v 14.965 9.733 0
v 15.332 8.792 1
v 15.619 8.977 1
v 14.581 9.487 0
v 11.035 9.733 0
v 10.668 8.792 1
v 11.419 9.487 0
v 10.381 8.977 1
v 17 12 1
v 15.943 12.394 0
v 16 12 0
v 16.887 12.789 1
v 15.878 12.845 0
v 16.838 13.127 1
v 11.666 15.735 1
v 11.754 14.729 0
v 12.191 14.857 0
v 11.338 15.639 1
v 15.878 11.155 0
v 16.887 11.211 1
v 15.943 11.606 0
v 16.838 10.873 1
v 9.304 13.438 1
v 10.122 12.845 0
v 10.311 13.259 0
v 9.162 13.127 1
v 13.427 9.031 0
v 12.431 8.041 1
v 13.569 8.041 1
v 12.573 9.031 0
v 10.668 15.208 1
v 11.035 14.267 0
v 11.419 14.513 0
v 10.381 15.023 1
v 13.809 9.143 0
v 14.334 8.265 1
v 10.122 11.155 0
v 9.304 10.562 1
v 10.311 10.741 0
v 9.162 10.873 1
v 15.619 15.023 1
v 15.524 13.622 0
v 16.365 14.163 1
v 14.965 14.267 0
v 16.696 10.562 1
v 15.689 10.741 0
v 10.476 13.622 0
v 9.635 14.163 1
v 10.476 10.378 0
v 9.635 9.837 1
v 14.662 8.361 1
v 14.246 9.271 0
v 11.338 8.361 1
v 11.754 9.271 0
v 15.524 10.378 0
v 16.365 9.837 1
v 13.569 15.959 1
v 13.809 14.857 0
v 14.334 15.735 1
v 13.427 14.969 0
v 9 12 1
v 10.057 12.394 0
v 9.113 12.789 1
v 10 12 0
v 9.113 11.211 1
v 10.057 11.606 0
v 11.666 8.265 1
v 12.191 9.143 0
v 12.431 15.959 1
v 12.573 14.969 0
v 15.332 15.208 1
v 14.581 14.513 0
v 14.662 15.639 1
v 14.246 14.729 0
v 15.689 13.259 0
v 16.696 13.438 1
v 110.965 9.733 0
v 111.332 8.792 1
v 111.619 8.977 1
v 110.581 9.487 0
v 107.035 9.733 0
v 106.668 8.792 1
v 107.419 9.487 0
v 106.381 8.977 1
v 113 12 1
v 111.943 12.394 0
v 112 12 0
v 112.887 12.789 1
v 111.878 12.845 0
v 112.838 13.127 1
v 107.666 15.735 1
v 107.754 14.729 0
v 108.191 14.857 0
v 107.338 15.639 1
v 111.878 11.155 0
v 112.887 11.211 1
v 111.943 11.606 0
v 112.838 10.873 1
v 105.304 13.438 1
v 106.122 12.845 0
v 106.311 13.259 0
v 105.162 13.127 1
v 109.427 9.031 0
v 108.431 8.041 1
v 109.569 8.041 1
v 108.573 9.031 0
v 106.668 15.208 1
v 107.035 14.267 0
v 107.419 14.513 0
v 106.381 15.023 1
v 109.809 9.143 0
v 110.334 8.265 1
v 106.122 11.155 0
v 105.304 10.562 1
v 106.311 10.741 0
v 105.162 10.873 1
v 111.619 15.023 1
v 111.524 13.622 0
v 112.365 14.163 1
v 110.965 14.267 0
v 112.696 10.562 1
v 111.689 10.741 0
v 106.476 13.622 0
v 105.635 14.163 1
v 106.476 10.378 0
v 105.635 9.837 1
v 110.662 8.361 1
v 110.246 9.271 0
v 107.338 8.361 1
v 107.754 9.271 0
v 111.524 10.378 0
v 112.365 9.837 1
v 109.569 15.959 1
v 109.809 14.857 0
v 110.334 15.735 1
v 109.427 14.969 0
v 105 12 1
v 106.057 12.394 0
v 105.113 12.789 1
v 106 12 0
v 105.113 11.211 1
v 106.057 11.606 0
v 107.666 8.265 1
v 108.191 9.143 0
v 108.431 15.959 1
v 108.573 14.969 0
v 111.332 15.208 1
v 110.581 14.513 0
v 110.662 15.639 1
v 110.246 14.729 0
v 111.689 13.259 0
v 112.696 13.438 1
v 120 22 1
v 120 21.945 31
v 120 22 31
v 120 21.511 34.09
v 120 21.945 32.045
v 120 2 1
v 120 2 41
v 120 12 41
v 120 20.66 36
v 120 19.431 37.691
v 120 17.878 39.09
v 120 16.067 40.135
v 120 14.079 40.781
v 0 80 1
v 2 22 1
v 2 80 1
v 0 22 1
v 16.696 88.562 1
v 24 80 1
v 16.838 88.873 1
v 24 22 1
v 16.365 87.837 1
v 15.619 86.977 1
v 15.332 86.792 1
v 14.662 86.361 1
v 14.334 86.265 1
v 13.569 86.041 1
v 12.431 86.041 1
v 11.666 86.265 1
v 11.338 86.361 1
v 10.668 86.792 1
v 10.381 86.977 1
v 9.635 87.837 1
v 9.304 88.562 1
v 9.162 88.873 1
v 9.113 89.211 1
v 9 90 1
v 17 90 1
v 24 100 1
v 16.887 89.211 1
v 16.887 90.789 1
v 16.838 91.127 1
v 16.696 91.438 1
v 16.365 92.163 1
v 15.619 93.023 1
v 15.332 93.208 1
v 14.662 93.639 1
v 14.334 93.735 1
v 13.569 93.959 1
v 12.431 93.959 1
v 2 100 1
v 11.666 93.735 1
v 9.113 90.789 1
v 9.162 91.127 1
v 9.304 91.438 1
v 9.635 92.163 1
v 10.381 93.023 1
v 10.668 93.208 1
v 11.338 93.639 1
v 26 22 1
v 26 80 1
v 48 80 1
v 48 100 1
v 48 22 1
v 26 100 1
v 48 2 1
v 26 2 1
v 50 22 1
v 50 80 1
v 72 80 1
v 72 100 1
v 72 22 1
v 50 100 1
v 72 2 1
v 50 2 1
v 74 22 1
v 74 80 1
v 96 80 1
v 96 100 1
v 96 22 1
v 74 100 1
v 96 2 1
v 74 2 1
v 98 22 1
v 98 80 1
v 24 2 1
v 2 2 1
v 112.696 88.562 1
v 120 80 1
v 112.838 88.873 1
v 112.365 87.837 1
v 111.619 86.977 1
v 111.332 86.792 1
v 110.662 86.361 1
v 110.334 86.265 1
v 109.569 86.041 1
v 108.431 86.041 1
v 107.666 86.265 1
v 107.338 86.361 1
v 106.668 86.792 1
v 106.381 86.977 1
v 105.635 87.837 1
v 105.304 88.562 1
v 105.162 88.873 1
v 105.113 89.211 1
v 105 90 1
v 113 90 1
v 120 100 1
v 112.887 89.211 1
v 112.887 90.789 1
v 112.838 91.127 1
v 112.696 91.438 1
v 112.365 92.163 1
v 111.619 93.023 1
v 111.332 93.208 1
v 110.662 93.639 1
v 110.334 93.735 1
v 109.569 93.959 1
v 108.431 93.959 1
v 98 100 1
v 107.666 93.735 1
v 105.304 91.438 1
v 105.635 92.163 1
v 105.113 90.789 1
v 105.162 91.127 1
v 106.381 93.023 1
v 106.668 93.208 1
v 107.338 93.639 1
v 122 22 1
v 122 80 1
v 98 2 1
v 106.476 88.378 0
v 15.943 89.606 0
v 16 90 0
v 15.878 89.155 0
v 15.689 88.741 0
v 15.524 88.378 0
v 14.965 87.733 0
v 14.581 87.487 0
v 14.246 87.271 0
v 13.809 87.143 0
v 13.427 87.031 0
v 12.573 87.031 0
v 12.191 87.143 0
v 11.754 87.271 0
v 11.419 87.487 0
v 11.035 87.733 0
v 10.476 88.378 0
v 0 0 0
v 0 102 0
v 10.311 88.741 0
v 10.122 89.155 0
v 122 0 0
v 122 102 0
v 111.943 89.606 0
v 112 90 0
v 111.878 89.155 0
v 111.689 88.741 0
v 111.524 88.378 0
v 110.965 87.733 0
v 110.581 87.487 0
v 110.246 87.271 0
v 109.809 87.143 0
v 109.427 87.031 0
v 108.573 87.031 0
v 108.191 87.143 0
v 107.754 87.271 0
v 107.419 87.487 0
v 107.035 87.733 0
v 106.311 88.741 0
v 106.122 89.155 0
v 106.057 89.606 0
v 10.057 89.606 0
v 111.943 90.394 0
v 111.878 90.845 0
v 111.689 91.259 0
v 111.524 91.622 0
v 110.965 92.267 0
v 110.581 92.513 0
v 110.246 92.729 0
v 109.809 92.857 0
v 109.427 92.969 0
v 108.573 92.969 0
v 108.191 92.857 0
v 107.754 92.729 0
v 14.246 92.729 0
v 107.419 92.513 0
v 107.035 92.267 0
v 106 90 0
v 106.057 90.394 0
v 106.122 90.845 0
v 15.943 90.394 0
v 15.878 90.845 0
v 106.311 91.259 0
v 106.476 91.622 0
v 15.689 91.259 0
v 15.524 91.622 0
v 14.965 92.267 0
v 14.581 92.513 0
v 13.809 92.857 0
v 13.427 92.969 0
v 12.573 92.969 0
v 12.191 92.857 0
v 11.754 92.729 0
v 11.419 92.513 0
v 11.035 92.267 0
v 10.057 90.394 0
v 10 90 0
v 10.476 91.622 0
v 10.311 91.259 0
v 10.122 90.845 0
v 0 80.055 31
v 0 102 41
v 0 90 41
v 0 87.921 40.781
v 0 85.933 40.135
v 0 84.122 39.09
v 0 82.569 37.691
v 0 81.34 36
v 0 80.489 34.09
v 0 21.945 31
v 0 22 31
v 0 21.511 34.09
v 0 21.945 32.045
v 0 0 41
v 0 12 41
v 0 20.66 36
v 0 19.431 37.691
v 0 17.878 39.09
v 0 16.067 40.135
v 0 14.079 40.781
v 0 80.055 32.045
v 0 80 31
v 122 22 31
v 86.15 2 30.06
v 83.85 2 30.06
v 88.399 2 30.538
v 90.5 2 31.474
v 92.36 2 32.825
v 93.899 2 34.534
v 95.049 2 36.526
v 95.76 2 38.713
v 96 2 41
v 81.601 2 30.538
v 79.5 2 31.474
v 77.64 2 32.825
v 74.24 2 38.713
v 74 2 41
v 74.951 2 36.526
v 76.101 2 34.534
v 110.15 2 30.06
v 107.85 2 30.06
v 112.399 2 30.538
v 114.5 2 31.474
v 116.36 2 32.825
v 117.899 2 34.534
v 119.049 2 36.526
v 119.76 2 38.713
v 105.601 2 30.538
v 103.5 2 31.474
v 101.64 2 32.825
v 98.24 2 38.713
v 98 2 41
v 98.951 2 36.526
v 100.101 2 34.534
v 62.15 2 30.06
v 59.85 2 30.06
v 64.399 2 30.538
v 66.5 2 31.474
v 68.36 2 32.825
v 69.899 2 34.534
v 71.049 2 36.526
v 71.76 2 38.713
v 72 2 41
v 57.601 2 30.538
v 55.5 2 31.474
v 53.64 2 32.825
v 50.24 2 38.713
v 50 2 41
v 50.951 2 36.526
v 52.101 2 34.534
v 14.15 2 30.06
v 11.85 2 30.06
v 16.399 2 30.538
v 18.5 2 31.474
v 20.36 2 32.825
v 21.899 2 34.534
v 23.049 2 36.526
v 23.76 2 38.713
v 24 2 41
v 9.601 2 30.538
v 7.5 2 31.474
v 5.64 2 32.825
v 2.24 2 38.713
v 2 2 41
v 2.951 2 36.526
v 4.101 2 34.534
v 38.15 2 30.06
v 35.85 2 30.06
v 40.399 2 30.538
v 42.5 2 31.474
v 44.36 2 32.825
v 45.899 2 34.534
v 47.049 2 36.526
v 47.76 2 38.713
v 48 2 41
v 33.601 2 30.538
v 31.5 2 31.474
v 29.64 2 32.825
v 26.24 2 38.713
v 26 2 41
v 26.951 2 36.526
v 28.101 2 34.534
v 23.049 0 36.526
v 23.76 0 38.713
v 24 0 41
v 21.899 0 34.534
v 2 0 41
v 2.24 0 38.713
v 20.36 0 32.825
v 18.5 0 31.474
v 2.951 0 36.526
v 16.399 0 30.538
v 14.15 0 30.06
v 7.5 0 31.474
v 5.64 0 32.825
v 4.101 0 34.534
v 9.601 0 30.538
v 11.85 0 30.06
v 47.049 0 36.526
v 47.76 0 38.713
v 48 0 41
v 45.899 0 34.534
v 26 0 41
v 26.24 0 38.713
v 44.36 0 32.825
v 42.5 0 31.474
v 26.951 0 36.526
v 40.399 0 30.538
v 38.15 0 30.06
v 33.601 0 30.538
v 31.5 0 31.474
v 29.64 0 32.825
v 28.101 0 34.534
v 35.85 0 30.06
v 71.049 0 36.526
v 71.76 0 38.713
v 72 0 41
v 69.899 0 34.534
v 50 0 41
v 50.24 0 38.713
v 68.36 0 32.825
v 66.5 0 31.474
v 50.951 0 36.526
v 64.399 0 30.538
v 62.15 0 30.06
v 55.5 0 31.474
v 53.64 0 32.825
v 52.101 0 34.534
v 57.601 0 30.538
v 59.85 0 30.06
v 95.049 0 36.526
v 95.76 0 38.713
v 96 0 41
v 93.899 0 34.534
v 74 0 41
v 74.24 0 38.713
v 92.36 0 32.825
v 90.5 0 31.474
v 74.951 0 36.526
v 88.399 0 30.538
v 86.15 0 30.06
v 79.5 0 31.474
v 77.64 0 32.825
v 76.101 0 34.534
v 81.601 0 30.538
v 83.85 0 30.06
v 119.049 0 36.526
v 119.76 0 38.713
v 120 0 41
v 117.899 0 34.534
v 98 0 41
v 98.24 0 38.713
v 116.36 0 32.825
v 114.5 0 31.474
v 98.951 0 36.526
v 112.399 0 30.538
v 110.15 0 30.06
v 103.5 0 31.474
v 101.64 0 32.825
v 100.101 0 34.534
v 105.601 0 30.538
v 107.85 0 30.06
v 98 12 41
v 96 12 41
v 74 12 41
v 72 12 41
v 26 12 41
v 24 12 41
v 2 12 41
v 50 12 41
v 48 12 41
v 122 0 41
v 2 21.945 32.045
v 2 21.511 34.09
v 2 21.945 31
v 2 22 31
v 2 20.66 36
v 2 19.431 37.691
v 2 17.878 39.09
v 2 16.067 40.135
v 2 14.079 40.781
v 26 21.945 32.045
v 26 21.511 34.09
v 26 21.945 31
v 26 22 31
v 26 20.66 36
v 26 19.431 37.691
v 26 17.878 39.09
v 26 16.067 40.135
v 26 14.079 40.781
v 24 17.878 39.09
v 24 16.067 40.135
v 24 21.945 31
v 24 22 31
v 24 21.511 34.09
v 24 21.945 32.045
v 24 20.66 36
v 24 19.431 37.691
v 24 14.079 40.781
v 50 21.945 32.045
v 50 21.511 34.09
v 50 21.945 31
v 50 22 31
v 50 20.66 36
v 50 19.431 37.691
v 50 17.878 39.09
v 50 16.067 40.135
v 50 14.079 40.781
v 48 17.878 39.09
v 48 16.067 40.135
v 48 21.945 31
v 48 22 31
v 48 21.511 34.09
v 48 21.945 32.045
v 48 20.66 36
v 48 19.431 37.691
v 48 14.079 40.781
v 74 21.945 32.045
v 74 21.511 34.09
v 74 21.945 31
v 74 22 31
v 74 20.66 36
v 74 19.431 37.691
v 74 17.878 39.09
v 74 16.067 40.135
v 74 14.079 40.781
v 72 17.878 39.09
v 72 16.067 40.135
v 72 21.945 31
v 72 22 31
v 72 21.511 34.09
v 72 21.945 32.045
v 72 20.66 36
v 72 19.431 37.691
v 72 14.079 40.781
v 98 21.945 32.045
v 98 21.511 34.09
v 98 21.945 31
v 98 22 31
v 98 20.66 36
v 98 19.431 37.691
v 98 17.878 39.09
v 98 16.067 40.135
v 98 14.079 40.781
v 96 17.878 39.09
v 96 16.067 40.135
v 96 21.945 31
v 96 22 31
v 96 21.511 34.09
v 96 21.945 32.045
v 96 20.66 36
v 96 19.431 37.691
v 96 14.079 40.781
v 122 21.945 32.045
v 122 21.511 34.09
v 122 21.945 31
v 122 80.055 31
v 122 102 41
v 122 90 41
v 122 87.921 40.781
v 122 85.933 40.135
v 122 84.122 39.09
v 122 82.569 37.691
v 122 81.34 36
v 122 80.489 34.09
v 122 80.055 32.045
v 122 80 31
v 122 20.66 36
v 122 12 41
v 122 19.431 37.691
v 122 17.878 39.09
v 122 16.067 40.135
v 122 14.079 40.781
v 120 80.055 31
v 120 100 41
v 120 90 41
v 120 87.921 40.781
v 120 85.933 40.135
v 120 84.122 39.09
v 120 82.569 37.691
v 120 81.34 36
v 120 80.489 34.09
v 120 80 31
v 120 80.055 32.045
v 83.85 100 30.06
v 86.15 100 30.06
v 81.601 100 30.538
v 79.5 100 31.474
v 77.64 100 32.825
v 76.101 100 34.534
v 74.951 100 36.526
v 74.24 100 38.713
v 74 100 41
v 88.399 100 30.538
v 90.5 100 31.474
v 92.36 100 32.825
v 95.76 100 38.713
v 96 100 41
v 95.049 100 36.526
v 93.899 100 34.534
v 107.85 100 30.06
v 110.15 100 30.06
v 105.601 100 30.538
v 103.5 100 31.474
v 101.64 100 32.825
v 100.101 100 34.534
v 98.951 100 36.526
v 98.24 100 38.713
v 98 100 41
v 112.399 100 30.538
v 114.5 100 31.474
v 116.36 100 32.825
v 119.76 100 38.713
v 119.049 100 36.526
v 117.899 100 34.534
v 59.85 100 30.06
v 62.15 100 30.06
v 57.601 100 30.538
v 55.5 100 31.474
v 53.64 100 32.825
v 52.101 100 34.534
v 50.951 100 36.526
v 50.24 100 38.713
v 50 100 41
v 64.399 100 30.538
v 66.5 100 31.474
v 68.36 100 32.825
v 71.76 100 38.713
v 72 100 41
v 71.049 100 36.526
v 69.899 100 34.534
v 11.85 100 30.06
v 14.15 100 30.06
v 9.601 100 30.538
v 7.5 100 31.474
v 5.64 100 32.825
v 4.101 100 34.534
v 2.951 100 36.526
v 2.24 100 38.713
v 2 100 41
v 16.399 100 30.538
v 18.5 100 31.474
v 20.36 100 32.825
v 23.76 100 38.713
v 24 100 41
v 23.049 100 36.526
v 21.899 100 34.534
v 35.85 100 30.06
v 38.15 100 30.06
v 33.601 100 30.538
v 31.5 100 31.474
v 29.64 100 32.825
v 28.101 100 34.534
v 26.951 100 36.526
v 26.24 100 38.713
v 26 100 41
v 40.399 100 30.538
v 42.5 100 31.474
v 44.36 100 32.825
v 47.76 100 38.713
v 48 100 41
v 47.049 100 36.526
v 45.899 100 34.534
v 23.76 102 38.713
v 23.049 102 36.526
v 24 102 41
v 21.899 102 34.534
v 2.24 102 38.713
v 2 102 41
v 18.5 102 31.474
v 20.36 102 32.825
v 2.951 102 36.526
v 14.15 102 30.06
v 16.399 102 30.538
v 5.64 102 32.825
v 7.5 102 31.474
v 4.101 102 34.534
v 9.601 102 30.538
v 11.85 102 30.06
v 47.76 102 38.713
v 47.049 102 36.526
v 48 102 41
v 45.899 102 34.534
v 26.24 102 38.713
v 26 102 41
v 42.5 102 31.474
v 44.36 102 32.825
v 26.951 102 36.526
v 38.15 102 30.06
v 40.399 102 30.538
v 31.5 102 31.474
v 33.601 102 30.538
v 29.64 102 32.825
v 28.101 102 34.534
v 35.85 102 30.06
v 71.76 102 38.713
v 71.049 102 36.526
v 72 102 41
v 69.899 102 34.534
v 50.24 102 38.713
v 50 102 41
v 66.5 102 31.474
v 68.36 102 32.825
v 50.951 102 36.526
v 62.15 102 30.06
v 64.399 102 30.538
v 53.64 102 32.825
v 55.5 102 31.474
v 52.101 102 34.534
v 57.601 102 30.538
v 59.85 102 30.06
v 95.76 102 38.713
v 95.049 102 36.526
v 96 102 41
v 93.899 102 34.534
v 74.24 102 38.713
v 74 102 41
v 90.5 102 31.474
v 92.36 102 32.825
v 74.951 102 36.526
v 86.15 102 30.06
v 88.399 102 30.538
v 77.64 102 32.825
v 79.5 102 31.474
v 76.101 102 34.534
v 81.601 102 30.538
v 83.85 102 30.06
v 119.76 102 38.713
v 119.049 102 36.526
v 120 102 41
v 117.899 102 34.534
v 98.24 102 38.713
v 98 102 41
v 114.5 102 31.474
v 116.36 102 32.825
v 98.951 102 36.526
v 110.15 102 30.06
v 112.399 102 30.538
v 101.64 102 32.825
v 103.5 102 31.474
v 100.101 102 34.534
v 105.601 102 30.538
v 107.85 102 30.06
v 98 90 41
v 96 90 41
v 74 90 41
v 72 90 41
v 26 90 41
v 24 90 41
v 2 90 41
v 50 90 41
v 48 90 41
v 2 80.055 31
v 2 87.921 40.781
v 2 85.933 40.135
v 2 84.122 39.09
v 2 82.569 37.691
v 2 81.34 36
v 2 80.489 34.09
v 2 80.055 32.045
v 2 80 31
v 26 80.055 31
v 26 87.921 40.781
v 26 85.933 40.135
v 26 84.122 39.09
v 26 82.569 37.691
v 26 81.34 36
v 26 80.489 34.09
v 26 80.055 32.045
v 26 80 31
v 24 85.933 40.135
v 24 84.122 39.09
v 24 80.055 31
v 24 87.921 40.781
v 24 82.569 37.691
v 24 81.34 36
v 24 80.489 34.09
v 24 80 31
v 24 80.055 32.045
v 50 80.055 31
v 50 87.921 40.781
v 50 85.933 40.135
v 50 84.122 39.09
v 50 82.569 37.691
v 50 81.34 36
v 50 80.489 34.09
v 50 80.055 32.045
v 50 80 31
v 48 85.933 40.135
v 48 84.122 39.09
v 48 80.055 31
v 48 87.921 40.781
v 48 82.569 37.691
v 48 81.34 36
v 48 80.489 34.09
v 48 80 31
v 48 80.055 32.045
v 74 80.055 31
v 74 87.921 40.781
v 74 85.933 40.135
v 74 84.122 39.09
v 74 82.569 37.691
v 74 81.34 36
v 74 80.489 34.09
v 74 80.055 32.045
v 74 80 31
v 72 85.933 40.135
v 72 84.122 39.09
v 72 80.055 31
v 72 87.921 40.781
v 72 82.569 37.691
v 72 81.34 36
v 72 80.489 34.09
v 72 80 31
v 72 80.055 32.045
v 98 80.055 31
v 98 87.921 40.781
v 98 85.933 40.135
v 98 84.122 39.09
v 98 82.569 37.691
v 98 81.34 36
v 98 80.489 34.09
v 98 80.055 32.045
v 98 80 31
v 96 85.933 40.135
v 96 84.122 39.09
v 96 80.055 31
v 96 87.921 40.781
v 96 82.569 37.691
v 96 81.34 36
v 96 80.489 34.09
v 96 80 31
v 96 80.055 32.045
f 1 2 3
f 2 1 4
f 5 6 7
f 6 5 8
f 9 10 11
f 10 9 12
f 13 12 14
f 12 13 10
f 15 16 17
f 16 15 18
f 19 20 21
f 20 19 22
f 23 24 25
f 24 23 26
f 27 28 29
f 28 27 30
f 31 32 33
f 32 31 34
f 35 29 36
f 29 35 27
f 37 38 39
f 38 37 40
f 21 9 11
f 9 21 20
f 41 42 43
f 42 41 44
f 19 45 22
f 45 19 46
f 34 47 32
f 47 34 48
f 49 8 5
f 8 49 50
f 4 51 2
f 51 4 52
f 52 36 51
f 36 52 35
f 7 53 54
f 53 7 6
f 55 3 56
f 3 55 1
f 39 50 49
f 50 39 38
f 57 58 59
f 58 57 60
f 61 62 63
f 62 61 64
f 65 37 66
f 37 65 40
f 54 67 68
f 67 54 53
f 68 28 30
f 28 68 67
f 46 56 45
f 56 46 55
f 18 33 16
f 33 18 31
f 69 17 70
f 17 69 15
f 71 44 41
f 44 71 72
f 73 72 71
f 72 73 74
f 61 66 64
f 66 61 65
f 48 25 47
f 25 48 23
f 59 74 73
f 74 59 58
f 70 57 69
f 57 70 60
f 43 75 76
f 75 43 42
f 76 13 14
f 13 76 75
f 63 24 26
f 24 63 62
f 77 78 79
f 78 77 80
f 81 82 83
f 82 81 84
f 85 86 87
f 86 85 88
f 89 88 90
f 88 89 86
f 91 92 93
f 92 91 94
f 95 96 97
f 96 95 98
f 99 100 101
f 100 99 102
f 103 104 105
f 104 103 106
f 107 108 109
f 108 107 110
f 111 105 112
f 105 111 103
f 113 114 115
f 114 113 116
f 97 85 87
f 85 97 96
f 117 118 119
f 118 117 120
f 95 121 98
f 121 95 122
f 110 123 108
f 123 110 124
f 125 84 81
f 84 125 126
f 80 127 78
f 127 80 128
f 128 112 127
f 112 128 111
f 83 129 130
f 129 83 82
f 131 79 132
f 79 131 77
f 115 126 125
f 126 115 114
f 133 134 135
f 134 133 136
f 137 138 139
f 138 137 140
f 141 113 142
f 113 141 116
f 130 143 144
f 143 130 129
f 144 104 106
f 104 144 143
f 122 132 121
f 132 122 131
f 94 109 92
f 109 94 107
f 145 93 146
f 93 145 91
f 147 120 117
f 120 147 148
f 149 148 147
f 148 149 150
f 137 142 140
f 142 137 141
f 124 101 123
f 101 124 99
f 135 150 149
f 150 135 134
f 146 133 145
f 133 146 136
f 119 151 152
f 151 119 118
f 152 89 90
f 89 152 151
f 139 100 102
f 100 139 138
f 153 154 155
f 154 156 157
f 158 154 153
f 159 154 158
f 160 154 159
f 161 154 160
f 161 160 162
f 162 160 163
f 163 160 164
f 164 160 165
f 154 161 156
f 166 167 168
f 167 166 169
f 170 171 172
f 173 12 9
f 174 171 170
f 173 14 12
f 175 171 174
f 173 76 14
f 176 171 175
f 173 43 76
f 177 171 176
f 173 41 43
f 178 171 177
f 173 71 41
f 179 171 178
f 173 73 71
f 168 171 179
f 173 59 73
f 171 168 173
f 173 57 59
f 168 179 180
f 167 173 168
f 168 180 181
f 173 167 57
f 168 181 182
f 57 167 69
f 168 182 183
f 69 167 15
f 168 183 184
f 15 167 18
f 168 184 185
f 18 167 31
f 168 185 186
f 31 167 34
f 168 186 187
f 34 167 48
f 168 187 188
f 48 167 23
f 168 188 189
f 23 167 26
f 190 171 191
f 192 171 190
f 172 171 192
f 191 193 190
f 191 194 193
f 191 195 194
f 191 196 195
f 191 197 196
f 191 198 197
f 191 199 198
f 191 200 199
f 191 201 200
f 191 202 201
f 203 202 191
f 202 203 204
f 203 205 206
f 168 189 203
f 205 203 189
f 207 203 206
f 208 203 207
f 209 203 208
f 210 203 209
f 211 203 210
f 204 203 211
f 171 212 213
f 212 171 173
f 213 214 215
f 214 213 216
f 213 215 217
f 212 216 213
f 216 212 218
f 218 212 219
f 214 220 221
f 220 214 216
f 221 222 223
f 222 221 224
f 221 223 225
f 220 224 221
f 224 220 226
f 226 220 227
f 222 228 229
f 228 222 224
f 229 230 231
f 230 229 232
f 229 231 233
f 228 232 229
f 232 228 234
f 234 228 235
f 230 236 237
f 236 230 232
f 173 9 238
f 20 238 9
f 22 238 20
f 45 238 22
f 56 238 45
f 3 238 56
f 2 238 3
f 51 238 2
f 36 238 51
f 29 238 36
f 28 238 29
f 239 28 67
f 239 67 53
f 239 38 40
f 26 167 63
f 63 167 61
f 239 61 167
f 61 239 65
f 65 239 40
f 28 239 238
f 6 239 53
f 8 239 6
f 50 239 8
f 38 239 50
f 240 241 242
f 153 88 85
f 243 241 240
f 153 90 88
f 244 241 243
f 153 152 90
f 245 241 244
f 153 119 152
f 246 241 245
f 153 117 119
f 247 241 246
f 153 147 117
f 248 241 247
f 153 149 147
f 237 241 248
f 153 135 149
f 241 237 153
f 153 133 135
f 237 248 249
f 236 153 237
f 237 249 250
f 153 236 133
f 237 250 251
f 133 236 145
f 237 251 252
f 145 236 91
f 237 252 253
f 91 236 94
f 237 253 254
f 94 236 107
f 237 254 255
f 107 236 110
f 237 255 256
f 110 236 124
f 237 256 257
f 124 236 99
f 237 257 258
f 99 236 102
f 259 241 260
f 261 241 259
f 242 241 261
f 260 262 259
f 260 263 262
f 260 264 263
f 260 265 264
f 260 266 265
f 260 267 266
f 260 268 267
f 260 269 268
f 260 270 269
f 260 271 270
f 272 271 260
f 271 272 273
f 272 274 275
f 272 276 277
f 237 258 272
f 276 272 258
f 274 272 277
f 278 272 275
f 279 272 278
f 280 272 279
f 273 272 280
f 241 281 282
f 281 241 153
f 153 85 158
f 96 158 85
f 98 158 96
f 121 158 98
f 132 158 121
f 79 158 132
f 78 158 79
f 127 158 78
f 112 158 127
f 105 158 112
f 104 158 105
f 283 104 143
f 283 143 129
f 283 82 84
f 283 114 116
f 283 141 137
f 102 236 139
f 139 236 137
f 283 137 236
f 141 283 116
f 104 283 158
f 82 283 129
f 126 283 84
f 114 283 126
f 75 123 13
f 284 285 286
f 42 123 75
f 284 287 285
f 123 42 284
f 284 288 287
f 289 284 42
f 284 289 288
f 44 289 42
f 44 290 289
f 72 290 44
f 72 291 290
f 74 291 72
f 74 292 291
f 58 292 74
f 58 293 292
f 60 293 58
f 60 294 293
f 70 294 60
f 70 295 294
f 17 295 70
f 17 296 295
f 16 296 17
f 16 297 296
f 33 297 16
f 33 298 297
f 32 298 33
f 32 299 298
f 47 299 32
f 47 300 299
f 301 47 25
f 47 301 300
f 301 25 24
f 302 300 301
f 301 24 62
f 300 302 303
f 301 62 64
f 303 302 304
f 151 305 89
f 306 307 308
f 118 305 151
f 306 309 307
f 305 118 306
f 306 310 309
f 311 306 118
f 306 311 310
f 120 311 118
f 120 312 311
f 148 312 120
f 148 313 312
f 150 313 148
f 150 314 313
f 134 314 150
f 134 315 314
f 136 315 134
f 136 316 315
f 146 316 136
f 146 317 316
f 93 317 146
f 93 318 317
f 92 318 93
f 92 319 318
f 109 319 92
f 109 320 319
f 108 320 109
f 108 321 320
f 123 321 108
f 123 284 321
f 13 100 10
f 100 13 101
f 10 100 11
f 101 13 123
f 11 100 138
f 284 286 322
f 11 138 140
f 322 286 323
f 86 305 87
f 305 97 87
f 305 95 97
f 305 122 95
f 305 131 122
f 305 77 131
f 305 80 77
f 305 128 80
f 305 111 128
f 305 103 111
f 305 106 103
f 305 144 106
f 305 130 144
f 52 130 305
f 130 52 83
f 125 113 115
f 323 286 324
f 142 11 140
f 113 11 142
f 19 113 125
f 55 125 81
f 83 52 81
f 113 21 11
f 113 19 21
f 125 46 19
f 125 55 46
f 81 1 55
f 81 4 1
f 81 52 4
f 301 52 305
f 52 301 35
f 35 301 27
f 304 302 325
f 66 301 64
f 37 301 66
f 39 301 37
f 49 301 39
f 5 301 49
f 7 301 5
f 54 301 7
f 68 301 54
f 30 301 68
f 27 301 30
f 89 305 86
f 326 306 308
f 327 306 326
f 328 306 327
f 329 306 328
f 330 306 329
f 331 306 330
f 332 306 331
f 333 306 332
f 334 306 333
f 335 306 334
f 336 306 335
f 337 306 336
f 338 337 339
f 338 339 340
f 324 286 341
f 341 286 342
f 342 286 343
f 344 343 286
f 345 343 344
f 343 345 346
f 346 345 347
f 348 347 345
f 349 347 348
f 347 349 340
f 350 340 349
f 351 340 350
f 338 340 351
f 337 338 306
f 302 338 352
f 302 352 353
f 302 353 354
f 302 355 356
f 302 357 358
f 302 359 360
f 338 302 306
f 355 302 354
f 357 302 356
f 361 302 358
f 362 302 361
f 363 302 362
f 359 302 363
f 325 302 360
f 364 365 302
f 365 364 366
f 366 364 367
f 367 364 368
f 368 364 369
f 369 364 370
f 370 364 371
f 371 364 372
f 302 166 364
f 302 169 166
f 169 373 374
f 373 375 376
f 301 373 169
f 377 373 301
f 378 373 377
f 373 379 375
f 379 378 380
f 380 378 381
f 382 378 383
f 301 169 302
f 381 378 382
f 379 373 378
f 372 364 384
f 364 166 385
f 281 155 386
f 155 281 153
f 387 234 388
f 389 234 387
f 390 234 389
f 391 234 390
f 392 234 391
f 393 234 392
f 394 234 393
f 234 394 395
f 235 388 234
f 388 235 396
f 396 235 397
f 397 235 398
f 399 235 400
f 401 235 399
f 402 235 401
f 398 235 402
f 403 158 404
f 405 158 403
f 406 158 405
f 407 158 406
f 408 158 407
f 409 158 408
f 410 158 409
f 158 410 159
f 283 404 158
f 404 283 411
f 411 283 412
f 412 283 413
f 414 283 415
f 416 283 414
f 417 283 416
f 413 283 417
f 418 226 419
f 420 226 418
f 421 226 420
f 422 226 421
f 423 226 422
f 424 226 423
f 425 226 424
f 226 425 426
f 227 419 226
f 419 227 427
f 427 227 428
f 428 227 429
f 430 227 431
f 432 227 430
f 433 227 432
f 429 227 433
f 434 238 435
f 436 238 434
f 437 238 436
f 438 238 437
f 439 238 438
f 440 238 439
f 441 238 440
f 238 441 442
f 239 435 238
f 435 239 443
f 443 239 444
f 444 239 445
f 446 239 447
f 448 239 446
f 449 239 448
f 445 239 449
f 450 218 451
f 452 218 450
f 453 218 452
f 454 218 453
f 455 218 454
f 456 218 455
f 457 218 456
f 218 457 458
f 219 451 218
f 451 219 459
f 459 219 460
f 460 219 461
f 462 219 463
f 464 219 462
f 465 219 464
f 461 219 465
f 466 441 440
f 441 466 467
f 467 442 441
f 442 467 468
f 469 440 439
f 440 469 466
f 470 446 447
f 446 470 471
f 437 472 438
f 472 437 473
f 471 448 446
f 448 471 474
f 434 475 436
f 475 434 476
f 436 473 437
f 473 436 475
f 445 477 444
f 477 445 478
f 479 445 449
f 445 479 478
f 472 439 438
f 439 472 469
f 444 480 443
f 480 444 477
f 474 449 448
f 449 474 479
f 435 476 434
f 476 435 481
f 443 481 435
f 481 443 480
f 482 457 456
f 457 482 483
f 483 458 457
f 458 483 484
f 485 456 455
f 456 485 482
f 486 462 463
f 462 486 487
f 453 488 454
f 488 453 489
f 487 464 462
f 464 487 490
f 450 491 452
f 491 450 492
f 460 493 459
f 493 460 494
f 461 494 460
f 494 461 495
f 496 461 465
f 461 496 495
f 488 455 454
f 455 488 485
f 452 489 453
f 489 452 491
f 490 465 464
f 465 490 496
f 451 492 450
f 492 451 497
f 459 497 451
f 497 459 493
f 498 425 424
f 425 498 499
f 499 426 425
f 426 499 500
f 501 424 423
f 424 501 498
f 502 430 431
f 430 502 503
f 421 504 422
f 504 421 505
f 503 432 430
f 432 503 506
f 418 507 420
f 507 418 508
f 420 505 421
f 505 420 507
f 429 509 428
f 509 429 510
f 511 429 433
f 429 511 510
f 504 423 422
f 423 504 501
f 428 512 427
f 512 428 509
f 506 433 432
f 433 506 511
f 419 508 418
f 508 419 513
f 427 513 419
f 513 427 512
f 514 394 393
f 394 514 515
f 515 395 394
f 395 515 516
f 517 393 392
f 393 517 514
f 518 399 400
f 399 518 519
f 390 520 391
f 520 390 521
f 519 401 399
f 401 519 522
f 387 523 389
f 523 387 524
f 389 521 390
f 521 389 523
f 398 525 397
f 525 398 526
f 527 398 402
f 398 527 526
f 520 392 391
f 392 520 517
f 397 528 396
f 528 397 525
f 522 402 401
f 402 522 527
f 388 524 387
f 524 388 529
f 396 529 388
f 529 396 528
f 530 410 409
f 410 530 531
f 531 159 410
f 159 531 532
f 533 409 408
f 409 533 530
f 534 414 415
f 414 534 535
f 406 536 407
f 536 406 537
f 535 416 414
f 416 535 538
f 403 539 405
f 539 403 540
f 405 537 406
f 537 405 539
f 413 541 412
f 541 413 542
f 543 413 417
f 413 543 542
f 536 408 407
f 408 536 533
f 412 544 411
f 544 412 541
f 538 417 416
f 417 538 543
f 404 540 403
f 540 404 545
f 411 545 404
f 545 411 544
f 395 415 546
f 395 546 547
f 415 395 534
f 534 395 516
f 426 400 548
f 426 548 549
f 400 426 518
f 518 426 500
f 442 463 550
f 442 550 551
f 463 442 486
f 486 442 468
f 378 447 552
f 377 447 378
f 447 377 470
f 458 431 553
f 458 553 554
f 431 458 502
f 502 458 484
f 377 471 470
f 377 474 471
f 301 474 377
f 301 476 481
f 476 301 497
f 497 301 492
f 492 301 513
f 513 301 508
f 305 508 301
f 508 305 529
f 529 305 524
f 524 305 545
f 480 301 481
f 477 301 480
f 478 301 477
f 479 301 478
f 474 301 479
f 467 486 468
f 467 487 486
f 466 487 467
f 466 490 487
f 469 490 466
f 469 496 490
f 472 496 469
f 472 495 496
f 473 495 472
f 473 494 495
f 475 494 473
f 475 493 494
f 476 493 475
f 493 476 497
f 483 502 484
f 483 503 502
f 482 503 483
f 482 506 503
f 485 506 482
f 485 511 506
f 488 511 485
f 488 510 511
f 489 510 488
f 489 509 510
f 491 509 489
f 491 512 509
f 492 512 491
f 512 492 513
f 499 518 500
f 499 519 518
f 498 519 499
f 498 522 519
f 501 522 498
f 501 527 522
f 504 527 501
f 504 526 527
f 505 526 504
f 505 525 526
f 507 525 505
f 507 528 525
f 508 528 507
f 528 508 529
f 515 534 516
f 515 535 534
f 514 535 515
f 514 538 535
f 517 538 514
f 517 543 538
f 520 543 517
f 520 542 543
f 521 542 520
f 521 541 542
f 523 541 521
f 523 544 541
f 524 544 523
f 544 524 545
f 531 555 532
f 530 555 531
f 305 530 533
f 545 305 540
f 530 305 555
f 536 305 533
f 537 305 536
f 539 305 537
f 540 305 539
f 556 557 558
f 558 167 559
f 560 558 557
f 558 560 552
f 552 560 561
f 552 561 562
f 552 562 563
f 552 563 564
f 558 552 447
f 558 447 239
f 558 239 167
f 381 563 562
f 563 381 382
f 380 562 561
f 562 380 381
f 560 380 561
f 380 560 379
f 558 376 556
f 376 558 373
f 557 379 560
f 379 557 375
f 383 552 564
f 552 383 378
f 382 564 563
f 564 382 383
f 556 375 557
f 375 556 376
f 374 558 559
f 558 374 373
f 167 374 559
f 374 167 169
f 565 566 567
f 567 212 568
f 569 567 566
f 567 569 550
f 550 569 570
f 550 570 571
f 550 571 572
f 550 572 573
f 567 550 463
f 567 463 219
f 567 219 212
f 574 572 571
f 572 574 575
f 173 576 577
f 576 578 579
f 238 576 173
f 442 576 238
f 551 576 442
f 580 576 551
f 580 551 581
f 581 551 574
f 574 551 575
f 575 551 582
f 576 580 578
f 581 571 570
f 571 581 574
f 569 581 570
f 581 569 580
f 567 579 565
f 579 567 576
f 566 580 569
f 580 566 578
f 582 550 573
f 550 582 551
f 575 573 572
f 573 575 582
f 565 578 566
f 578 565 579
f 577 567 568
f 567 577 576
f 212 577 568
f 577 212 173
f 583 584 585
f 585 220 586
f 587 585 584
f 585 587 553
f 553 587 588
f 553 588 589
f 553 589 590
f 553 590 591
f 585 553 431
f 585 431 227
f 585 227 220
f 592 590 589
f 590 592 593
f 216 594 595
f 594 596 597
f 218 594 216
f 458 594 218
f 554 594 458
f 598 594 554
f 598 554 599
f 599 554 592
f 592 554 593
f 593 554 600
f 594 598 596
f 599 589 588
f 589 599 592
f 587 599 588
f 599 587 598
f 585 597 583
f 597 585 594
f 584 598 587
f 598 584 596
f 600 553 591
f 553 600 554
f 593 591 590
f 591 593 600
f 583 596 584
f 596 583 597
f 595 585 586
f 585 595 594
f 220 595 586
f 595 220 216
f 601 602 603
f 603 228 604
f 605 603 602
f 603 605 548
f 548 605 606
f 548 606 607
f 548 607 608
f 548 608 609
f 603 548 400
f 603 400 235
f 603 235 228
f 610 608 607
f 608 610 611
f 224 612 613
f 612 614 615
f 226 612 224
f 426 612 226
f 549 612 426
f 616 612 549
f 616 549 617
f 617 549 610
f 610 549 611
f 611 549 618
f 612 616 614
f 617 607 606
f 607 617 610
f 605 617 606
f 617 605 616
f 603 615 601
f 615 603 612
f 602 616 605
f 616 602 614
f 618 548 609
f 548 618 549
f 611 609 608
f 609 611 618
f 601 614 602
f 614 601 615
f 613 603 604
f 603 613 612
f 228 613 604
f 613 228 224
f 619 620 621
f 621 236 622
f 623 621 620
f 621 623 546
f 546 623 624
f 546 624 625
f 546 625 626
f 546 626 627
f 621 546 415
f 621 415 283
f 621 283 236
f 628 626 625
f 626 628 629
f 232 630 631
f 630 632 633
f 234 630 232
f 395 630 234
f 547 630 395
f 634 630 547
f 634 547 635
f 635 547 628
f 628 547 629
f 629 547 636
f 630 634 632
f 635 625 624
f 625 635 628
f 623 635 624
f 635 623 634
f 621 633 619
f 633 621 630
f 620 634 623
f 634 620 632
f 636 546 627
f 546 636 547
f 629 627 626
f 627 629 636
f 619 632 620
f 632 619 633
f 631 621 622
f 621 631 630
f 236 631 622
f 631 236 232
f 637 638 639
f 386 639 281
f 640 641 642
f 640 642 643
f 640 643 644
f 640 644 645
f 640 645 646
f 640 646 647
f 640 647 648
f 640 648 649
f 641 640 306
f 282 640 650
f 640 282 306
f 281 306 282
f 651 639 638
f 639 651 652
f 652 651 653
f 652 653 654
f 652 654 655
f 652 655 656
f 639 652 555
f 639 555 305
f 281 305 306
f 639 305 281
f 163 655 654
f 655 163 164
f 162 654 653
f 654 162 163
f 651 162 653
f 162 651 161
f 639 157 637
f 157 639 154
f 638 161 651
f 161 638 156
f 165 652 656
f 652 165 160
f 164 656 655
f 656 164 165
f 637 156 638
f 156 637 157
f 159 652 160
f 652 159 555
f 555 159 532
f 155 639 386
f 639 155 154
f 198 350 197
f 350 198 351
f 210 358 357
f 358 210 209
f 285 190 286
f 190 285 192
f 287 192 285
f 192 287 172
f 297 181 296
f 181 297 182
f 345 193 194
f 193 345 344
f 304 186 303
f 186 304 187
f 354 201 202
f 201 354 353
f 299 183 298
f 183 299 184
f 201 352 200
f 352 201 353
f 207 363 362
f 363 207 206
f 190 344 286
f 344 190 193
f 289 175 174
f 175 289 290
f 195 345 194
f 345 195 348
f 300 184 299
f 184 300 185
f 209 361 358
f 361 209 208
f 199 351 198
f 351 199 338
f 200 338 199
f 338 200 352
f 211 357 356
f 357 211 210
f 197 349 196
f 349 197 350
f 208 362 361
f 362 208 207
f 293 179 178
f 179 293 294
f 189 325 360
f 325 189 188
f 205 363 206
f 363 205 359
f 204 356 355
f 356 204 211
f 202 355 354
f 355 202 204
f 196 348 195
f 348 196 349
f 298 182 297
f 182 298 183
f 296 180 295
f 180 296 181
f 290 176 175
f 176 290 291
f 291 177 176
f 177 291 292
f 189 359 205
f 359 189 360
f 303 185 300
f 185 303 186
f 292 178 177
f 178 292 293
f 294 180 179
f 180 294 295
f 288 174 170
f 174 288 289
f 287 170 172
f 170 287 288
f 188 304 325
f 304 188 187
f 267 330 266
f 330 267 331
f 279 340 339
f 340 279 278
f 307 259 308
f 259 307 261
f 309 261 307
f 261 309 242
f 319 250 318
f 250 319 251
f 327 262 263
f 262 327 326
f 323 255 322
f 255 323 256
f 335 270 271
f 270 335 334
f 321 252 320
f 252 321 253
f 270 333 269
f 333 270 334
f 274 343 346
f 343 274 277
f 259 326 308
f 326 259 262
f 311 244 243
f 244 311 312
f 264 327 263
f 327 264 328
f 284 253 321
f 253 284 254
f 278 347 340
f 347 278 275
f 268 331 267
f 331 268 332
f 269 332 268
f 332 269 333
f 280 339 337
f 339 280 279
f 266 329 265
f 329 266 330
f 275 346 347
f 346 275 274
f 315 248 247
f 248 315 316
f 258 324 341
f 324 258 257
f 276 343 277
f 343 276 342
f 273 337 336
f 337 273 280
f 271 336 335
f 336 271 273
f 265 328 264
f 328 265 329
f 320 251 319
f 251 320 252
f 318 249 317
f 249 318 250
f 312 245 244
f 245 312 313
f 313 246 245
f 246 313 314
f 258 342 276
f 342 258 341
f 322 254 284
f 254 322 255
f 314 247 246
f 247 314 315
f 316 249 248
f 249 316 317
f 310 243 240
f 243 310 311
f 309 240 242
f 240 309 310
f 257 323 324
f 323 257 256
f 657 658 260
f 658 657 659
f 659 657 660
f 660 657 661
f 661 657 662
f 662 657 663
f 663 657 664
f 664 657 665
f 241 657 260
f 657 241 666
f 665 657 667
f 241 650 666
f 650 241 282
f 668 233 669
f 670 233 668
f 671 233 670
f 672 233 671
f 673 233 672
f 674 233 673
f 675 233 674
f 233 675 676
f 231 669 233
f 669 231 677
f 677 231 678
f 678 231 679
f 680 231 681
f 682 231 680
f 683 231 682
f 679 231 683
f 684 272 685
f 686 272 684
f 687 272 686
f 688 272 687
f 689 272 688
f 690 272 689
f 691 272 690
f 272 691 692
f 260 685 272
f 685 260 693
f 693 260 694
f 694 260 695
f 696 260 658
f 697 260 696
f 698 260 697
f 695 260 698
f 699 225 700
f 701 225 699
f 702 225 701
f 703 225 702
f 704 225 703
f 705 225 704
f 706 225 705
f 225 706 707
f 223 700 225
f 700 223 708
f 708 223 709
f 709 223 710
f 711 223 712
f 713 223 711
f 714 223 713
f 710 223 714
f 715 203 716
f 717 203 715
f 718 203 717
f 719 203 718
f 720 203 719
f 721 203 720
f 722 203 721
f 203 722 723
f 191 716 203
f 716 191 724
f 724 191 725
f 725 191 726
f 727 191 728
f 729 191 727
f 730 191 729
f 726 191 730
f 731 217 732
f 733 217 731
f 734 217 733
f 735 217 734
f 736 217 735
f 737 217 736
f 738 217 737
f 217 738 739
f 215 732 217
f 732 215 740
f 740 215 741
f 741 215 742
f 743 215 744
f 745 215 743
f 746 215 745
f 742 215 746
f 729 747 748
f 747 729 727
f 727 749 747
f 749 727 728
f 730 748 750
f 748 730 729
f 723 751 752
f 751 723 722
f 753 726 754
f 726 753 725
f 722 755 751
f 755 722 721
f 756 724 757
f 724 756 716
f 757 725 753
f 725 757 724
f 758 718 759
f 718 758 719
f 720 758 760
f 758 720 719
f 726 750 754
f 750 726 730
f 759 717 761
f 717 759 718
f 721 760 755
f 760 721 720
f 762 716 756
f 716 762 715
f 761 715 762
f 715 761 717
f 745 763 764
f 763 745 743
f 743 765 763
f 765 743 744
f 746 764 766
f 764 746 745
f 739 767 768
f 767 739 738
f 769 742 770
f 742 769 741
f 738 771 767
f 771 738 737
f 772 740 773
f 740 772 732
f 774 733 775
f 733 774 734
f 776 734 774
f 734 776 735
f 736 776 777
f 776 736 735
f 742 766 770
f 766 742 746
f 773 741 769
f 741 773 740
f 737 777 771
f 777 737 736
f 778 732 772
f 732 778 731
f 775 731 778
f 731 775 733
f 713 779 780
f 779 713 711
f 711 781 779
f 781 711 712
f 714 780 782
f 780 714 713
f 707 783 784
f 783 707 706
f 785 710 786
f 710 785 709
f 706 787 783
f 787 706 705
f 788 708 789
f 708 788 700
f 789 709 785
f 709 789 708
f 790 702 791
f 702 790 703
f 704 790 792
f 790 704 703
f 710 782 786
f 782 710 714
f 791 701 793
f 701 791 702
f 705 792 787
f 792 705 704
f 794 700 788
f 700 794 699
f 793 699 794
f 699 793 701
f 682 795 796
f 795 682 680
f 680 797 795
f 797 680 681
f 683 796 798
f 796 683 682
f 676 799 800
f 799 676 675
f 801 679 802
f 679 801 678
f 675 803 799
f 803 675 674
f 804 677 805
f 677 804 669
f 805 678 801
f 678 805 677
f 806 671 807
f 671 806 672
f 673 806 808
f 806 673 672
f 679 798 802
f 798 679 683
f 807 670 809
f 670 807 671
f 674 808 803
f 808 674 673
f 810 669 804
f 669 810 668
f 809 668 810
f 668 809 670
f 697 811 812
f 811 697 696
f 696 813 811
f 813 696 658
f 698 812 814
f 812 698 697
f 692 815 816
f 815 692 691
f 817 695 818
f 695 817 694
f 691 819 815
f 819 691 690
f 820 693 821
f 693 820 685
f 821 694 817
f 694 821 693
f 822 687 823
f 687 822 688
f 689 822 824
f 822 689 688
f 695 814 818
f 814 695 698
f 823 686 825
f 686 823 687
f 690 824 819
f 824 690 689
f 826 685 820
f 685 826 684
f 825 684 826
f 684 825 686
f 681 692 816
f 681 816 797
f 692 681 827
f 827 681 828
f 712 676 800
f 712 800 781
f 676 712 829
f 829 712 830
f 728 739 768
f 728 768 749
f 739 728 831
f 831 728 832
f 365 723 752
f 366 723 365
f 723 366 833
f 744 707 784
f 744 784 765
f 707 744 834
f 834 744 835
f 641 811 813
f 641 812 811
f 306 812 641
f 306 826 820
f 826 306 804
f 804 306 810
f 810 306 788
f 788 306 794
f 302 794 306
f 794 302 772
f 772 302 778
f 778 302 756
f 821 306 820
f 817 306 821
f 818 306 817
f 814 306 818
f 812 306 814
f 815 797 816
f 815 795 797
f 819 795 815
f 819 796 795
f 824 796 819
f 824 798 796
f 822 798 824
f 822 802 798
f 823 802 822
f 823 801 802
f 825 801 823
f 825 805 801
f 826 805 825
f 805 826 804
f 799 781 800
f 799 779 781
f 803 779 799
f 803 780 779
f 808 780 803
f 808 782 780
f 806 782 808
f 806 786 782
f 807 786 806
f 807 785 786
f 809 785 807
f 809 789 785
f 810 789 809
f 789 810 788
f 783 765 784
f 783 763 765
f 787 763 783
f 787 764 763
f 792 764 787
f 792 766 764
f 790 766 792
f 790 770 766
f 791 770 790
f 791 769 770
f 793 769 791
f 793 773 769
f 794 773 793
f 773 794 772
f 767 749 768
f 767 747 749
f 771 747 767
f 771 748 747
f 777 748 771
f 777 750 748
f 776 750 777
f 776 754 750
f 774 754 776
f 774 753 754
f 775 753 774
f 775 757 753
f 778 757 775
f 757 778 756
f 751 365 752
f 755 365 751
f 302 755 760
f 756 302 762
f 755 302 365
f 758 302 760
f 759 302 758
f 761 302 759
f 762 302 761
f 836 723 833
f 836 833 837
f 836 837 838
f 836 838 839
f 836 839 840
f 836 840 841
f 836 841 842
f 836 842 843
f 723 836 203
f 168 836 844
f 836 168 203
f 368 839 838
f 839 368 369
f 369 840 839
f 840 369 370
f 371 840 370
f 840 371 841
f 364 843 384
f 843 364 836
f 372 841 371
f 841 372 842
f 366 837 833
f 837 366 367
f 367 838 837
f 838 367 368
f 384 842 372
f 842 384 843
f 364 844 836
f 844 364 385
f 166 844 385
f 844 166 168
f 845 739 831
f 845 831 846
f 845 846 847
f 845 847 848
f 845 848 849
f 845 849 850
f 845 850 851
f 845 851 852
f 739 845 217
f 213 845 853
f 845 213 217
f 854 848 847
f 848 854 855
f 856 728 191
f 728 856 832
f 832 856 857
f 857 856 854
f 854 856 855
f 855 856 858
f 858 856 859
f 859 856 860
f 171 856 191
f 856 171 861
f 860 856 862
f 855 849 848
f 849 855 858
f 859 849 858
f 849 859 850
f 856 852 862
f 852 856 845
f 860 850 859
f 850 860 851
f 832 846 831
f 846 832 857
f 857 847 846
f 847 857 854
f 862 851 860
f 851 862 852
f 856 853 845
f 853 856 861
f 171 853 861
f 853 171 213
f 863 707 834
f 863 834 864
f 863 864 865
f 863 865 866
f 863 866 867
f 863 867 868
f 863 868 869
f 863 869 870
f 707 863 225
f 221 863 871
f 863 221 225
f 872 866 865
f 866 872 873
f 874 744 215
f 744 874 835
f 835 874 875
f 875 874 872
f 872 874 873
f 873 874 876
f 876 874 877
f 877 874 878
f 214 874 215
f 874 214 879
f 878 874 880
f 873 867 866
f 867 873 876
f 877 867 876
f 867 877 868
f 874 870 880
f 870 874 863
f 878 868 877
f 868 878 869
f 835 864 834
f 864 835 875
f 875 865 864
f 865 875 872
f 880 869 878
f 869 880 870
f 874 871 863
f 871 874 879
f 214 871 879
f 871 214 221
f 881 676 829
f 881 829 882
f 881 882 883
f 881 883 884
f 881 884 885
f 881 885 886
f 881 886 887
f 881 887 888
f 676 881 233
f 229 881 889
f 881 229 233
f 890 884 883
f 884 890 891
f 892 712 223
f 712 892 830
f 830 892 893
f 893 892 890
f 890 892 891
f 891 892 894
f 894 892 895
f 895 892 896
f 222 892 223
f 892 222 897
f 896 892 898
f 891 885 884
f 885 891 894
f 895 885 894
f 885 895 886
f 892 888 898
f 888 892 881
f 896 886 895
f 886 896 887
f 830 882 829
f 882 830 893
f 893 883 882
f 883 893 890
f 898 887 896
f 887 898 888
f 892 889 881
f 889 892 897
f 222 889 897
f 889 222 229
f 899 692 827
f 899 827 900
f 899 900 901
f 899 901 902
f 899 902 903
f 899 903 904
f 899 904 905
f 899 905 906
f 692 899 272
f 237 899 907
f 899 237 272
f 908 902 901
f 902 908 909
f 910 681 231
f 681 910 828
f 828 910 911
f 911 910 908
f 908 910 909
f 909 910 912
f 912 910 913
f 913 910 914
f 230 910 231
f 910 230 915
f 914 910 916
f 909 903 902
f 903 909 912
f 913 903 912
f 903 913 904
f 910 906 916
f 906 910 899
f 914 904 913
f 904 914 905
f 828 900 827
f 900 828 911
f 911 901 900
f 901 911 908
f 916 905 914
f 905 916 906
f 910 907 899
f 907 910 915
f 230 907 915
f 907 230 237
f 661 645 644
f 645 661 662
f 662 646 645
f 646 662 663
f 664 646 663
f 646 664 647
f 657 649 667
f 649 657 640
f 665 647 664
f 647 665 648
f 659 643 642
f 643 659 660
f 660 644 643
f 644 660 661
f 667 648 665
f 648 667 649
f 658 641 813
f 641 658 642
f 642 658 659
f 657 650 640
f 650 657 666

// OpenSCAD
//------------------------------------------------------------
// Parametric altoids storage racks 
//
// http://www.thingiverse.com/wardwouts
// 
//
//------------------------------------------------------------

// What type of storage do you want?
style = "fullwide"; // [full,fullwide, singleleft, singleright, middle]

// Number of tins to store
tins = 5;

// in the sides for easier tin grabbing?
cutouts = "yes"; // [yes,no]

screw_holes = "yes"; // [yes,no]

closed_ends = "no"; // [yes,no]

// For stacking multiple racks you may not want a bottom shelf
with_bottom_shelf = "yes"; // [yes,no]

// Side depth (how deep is a shelf in mm)
depth = 40;

// Side width (how wide is a shelf in mm)
width = 20;

wall_thickness = 2;
bottom_thickness = 1;

// Amount of play a tin should have at its sides
width_play = 0.5;

// Amount of play a tin should have between shelves
height_play = 0.5;

//////////////////////////////////////////////////////////////////
// Some tin measurements; these shouldn't need editing
// Thickness of an altoids tin as measured
tin_thickness = 21.5;
// as measured
tin_width = 62; 
// as measured
tin_length = 97.5;

//////////////////////////////////////////////////////////////////
// Code starts here

wtn = wall_thickness;
btn = bottom_thickness;

// the sace betwee 2 shelves
spacing = tin_thickness + height_play;

tin_tot_width = tin_width + width_play;
tin_tot_length = tin_length + width_play;

length=tins*spacing + tins*wtn;

module base() {
	// Draw the base wall thickness offset from origin
	translate([0,wtn,0]){
		if ( screw_holes == "yes"){
			difference(){
				cube([length,width,btn]);
				union() {
					translate([wtn+spacing/2,width/2,0]){
						screw_hole();
					}
					translate([length - spacing/2,width/2,0]){
						screw_hole();
					}
				}
			}
		} else {
			cube([length,width,btn]);
		}
	}
}

module side() {
	if (cutouts == "yes") {
		difference(){
			cube([length,wtn,depth+btn]);
			union(){
				for (i = [0 : tins - 1]){
					translate([wtn + (spacing/2) + (spacing+wtn)*i, -wtn, depth+btn]){
						rotate([270,0,0]){
							// if I aim for an exact cutout, some material remains,
							// so cutout 3*wtn
							cylinder(h=wtn*3,r=spacing/2);
						}
					}
				}
			}
		}
	} else {
		cube([length,wtn,depth+btn]);
	}
}

module shelf() {
	// Draws a single shelf with one rounded corner
	// To draw this it draws 2 rectangles and one cilinder like:
	// +--+-
	// |  |	 \
	// |  |+-+
	// +--++-+
	// As the circle may get to big it cuts everything off at the surrouning rectangle
	// Draw the base wall thickness and base thickness offset from origin
	translate([0,wtn,btn]){
		intersection() {
			cube([wtn,width,depth]);
			union() {
				translate([0,width/2,depth-width/2]){
					rotate([0,90,0]){
						cylinder(h=wtn, r=width/2);
					}
				}
				cube([wtn,width/2,depth]);
				translate([0,width/2,0]){
					cube([wtn,width/2,depth-width/2]);
				}
			}
		}
	}
}

module shelves() {
	// Draw the same number of shelves as there are tins
	// If with_bottom_shelf was chosen, draw one more
	for (i = [0 : tins - 1]){
		translate([(spacing+wtn)*i,0,0]){
			shelf();
		}
	}
	if (with_bottom_shelf == "yes"){
		translate([length,0,0]){
			shelf();
			// the end tray needs a bit more side and base too
			cube([wtn,wtn,btn+depth]);
			cube([wtn,width+wtn,btn]);
		}
	}
}

module spacer() {
	// If a full rack was chosen we need material to hold the two sides together
	// this module draws that bit
	if (style == "full" || style == "fullwide") {
		if (style == "full") {
			translate([0,width+wtn,0]){	
				if (with_bottom_shelf == "yes"){
					cube([length + wtn, tin_tot_width/2 - width, btn]);
				} else {
					cube([length, tin_tot_width/2 - width, btn]);
				}
			}
		} else {
			translate([0,width+wtn,0]){
				if (with_bottom_shelf == "yes"){
					cube([length + wtn, tin_tot_length/2 - width, btn]);
				} else {
					cube([length, tin_tot_length/2 - width, btn]);
				}
			}
		}
	}
}

module ends() {
	// It can be nice to have closed top and bottom shelves
	// If closed_ends have been chosen, fill up the ends
	if (closed_ends == "yes"){
		if (style == "full") {
			cube([wtn, tin_tot_width/2+wtn, depth+btn]);
		} else if (style == "fullwide") {
			cube([wtn, tin_tot_length/2+wtn, depth+btn]);
		}
		if (with_bottom_shelf == "yes"){
			translate([length,0,0]){
				if (style == "full") {
					cube([wtn, tin_tot_width/2+wtn, depth+btn]);
				} else if (style == "fullwide") {
					cube([wtn, tin_tot_length/2+wtn, depth+btn]);
				}
			}
		}
	}
}

module screw_hole() {
	// screw head that I measured maxes at 7mm
	// screw thread is 3.5 mm
	head = 7;
	thread = 3.5 + 0.5;

	translate([0,0,-20]){
		cylinder(h=30, r=thread/2, $fn=20);
	}
	translate([0,0,btn-(thread/2)]){
		cylinder(h=head-(thread/2), r1=thread/2, r2=head);
	}
}

module rack() {
	base();
	side();
	shelves();
	spacer();
	ends();
}

if (style == "singleright"){
	mirror([0,1,0]){
		rack();
	}
} else {
	rack();
}

if (style == "full") {
	translate([0, tin_tot_width+2*wtn,0]){
		mirror([0,1,0]){
			rack();
		}
	}
} else if (style == "fullwide") {
	translate([0, tin_tot_length+2*wtn,0]){
		mirror([0,1,0]){
			rack();
		}
	}
} else if (style == "middle") {
	translate([0, wtn, 0]){
		mirror([0,1,0]){
			rack();
		}
	}	
}
